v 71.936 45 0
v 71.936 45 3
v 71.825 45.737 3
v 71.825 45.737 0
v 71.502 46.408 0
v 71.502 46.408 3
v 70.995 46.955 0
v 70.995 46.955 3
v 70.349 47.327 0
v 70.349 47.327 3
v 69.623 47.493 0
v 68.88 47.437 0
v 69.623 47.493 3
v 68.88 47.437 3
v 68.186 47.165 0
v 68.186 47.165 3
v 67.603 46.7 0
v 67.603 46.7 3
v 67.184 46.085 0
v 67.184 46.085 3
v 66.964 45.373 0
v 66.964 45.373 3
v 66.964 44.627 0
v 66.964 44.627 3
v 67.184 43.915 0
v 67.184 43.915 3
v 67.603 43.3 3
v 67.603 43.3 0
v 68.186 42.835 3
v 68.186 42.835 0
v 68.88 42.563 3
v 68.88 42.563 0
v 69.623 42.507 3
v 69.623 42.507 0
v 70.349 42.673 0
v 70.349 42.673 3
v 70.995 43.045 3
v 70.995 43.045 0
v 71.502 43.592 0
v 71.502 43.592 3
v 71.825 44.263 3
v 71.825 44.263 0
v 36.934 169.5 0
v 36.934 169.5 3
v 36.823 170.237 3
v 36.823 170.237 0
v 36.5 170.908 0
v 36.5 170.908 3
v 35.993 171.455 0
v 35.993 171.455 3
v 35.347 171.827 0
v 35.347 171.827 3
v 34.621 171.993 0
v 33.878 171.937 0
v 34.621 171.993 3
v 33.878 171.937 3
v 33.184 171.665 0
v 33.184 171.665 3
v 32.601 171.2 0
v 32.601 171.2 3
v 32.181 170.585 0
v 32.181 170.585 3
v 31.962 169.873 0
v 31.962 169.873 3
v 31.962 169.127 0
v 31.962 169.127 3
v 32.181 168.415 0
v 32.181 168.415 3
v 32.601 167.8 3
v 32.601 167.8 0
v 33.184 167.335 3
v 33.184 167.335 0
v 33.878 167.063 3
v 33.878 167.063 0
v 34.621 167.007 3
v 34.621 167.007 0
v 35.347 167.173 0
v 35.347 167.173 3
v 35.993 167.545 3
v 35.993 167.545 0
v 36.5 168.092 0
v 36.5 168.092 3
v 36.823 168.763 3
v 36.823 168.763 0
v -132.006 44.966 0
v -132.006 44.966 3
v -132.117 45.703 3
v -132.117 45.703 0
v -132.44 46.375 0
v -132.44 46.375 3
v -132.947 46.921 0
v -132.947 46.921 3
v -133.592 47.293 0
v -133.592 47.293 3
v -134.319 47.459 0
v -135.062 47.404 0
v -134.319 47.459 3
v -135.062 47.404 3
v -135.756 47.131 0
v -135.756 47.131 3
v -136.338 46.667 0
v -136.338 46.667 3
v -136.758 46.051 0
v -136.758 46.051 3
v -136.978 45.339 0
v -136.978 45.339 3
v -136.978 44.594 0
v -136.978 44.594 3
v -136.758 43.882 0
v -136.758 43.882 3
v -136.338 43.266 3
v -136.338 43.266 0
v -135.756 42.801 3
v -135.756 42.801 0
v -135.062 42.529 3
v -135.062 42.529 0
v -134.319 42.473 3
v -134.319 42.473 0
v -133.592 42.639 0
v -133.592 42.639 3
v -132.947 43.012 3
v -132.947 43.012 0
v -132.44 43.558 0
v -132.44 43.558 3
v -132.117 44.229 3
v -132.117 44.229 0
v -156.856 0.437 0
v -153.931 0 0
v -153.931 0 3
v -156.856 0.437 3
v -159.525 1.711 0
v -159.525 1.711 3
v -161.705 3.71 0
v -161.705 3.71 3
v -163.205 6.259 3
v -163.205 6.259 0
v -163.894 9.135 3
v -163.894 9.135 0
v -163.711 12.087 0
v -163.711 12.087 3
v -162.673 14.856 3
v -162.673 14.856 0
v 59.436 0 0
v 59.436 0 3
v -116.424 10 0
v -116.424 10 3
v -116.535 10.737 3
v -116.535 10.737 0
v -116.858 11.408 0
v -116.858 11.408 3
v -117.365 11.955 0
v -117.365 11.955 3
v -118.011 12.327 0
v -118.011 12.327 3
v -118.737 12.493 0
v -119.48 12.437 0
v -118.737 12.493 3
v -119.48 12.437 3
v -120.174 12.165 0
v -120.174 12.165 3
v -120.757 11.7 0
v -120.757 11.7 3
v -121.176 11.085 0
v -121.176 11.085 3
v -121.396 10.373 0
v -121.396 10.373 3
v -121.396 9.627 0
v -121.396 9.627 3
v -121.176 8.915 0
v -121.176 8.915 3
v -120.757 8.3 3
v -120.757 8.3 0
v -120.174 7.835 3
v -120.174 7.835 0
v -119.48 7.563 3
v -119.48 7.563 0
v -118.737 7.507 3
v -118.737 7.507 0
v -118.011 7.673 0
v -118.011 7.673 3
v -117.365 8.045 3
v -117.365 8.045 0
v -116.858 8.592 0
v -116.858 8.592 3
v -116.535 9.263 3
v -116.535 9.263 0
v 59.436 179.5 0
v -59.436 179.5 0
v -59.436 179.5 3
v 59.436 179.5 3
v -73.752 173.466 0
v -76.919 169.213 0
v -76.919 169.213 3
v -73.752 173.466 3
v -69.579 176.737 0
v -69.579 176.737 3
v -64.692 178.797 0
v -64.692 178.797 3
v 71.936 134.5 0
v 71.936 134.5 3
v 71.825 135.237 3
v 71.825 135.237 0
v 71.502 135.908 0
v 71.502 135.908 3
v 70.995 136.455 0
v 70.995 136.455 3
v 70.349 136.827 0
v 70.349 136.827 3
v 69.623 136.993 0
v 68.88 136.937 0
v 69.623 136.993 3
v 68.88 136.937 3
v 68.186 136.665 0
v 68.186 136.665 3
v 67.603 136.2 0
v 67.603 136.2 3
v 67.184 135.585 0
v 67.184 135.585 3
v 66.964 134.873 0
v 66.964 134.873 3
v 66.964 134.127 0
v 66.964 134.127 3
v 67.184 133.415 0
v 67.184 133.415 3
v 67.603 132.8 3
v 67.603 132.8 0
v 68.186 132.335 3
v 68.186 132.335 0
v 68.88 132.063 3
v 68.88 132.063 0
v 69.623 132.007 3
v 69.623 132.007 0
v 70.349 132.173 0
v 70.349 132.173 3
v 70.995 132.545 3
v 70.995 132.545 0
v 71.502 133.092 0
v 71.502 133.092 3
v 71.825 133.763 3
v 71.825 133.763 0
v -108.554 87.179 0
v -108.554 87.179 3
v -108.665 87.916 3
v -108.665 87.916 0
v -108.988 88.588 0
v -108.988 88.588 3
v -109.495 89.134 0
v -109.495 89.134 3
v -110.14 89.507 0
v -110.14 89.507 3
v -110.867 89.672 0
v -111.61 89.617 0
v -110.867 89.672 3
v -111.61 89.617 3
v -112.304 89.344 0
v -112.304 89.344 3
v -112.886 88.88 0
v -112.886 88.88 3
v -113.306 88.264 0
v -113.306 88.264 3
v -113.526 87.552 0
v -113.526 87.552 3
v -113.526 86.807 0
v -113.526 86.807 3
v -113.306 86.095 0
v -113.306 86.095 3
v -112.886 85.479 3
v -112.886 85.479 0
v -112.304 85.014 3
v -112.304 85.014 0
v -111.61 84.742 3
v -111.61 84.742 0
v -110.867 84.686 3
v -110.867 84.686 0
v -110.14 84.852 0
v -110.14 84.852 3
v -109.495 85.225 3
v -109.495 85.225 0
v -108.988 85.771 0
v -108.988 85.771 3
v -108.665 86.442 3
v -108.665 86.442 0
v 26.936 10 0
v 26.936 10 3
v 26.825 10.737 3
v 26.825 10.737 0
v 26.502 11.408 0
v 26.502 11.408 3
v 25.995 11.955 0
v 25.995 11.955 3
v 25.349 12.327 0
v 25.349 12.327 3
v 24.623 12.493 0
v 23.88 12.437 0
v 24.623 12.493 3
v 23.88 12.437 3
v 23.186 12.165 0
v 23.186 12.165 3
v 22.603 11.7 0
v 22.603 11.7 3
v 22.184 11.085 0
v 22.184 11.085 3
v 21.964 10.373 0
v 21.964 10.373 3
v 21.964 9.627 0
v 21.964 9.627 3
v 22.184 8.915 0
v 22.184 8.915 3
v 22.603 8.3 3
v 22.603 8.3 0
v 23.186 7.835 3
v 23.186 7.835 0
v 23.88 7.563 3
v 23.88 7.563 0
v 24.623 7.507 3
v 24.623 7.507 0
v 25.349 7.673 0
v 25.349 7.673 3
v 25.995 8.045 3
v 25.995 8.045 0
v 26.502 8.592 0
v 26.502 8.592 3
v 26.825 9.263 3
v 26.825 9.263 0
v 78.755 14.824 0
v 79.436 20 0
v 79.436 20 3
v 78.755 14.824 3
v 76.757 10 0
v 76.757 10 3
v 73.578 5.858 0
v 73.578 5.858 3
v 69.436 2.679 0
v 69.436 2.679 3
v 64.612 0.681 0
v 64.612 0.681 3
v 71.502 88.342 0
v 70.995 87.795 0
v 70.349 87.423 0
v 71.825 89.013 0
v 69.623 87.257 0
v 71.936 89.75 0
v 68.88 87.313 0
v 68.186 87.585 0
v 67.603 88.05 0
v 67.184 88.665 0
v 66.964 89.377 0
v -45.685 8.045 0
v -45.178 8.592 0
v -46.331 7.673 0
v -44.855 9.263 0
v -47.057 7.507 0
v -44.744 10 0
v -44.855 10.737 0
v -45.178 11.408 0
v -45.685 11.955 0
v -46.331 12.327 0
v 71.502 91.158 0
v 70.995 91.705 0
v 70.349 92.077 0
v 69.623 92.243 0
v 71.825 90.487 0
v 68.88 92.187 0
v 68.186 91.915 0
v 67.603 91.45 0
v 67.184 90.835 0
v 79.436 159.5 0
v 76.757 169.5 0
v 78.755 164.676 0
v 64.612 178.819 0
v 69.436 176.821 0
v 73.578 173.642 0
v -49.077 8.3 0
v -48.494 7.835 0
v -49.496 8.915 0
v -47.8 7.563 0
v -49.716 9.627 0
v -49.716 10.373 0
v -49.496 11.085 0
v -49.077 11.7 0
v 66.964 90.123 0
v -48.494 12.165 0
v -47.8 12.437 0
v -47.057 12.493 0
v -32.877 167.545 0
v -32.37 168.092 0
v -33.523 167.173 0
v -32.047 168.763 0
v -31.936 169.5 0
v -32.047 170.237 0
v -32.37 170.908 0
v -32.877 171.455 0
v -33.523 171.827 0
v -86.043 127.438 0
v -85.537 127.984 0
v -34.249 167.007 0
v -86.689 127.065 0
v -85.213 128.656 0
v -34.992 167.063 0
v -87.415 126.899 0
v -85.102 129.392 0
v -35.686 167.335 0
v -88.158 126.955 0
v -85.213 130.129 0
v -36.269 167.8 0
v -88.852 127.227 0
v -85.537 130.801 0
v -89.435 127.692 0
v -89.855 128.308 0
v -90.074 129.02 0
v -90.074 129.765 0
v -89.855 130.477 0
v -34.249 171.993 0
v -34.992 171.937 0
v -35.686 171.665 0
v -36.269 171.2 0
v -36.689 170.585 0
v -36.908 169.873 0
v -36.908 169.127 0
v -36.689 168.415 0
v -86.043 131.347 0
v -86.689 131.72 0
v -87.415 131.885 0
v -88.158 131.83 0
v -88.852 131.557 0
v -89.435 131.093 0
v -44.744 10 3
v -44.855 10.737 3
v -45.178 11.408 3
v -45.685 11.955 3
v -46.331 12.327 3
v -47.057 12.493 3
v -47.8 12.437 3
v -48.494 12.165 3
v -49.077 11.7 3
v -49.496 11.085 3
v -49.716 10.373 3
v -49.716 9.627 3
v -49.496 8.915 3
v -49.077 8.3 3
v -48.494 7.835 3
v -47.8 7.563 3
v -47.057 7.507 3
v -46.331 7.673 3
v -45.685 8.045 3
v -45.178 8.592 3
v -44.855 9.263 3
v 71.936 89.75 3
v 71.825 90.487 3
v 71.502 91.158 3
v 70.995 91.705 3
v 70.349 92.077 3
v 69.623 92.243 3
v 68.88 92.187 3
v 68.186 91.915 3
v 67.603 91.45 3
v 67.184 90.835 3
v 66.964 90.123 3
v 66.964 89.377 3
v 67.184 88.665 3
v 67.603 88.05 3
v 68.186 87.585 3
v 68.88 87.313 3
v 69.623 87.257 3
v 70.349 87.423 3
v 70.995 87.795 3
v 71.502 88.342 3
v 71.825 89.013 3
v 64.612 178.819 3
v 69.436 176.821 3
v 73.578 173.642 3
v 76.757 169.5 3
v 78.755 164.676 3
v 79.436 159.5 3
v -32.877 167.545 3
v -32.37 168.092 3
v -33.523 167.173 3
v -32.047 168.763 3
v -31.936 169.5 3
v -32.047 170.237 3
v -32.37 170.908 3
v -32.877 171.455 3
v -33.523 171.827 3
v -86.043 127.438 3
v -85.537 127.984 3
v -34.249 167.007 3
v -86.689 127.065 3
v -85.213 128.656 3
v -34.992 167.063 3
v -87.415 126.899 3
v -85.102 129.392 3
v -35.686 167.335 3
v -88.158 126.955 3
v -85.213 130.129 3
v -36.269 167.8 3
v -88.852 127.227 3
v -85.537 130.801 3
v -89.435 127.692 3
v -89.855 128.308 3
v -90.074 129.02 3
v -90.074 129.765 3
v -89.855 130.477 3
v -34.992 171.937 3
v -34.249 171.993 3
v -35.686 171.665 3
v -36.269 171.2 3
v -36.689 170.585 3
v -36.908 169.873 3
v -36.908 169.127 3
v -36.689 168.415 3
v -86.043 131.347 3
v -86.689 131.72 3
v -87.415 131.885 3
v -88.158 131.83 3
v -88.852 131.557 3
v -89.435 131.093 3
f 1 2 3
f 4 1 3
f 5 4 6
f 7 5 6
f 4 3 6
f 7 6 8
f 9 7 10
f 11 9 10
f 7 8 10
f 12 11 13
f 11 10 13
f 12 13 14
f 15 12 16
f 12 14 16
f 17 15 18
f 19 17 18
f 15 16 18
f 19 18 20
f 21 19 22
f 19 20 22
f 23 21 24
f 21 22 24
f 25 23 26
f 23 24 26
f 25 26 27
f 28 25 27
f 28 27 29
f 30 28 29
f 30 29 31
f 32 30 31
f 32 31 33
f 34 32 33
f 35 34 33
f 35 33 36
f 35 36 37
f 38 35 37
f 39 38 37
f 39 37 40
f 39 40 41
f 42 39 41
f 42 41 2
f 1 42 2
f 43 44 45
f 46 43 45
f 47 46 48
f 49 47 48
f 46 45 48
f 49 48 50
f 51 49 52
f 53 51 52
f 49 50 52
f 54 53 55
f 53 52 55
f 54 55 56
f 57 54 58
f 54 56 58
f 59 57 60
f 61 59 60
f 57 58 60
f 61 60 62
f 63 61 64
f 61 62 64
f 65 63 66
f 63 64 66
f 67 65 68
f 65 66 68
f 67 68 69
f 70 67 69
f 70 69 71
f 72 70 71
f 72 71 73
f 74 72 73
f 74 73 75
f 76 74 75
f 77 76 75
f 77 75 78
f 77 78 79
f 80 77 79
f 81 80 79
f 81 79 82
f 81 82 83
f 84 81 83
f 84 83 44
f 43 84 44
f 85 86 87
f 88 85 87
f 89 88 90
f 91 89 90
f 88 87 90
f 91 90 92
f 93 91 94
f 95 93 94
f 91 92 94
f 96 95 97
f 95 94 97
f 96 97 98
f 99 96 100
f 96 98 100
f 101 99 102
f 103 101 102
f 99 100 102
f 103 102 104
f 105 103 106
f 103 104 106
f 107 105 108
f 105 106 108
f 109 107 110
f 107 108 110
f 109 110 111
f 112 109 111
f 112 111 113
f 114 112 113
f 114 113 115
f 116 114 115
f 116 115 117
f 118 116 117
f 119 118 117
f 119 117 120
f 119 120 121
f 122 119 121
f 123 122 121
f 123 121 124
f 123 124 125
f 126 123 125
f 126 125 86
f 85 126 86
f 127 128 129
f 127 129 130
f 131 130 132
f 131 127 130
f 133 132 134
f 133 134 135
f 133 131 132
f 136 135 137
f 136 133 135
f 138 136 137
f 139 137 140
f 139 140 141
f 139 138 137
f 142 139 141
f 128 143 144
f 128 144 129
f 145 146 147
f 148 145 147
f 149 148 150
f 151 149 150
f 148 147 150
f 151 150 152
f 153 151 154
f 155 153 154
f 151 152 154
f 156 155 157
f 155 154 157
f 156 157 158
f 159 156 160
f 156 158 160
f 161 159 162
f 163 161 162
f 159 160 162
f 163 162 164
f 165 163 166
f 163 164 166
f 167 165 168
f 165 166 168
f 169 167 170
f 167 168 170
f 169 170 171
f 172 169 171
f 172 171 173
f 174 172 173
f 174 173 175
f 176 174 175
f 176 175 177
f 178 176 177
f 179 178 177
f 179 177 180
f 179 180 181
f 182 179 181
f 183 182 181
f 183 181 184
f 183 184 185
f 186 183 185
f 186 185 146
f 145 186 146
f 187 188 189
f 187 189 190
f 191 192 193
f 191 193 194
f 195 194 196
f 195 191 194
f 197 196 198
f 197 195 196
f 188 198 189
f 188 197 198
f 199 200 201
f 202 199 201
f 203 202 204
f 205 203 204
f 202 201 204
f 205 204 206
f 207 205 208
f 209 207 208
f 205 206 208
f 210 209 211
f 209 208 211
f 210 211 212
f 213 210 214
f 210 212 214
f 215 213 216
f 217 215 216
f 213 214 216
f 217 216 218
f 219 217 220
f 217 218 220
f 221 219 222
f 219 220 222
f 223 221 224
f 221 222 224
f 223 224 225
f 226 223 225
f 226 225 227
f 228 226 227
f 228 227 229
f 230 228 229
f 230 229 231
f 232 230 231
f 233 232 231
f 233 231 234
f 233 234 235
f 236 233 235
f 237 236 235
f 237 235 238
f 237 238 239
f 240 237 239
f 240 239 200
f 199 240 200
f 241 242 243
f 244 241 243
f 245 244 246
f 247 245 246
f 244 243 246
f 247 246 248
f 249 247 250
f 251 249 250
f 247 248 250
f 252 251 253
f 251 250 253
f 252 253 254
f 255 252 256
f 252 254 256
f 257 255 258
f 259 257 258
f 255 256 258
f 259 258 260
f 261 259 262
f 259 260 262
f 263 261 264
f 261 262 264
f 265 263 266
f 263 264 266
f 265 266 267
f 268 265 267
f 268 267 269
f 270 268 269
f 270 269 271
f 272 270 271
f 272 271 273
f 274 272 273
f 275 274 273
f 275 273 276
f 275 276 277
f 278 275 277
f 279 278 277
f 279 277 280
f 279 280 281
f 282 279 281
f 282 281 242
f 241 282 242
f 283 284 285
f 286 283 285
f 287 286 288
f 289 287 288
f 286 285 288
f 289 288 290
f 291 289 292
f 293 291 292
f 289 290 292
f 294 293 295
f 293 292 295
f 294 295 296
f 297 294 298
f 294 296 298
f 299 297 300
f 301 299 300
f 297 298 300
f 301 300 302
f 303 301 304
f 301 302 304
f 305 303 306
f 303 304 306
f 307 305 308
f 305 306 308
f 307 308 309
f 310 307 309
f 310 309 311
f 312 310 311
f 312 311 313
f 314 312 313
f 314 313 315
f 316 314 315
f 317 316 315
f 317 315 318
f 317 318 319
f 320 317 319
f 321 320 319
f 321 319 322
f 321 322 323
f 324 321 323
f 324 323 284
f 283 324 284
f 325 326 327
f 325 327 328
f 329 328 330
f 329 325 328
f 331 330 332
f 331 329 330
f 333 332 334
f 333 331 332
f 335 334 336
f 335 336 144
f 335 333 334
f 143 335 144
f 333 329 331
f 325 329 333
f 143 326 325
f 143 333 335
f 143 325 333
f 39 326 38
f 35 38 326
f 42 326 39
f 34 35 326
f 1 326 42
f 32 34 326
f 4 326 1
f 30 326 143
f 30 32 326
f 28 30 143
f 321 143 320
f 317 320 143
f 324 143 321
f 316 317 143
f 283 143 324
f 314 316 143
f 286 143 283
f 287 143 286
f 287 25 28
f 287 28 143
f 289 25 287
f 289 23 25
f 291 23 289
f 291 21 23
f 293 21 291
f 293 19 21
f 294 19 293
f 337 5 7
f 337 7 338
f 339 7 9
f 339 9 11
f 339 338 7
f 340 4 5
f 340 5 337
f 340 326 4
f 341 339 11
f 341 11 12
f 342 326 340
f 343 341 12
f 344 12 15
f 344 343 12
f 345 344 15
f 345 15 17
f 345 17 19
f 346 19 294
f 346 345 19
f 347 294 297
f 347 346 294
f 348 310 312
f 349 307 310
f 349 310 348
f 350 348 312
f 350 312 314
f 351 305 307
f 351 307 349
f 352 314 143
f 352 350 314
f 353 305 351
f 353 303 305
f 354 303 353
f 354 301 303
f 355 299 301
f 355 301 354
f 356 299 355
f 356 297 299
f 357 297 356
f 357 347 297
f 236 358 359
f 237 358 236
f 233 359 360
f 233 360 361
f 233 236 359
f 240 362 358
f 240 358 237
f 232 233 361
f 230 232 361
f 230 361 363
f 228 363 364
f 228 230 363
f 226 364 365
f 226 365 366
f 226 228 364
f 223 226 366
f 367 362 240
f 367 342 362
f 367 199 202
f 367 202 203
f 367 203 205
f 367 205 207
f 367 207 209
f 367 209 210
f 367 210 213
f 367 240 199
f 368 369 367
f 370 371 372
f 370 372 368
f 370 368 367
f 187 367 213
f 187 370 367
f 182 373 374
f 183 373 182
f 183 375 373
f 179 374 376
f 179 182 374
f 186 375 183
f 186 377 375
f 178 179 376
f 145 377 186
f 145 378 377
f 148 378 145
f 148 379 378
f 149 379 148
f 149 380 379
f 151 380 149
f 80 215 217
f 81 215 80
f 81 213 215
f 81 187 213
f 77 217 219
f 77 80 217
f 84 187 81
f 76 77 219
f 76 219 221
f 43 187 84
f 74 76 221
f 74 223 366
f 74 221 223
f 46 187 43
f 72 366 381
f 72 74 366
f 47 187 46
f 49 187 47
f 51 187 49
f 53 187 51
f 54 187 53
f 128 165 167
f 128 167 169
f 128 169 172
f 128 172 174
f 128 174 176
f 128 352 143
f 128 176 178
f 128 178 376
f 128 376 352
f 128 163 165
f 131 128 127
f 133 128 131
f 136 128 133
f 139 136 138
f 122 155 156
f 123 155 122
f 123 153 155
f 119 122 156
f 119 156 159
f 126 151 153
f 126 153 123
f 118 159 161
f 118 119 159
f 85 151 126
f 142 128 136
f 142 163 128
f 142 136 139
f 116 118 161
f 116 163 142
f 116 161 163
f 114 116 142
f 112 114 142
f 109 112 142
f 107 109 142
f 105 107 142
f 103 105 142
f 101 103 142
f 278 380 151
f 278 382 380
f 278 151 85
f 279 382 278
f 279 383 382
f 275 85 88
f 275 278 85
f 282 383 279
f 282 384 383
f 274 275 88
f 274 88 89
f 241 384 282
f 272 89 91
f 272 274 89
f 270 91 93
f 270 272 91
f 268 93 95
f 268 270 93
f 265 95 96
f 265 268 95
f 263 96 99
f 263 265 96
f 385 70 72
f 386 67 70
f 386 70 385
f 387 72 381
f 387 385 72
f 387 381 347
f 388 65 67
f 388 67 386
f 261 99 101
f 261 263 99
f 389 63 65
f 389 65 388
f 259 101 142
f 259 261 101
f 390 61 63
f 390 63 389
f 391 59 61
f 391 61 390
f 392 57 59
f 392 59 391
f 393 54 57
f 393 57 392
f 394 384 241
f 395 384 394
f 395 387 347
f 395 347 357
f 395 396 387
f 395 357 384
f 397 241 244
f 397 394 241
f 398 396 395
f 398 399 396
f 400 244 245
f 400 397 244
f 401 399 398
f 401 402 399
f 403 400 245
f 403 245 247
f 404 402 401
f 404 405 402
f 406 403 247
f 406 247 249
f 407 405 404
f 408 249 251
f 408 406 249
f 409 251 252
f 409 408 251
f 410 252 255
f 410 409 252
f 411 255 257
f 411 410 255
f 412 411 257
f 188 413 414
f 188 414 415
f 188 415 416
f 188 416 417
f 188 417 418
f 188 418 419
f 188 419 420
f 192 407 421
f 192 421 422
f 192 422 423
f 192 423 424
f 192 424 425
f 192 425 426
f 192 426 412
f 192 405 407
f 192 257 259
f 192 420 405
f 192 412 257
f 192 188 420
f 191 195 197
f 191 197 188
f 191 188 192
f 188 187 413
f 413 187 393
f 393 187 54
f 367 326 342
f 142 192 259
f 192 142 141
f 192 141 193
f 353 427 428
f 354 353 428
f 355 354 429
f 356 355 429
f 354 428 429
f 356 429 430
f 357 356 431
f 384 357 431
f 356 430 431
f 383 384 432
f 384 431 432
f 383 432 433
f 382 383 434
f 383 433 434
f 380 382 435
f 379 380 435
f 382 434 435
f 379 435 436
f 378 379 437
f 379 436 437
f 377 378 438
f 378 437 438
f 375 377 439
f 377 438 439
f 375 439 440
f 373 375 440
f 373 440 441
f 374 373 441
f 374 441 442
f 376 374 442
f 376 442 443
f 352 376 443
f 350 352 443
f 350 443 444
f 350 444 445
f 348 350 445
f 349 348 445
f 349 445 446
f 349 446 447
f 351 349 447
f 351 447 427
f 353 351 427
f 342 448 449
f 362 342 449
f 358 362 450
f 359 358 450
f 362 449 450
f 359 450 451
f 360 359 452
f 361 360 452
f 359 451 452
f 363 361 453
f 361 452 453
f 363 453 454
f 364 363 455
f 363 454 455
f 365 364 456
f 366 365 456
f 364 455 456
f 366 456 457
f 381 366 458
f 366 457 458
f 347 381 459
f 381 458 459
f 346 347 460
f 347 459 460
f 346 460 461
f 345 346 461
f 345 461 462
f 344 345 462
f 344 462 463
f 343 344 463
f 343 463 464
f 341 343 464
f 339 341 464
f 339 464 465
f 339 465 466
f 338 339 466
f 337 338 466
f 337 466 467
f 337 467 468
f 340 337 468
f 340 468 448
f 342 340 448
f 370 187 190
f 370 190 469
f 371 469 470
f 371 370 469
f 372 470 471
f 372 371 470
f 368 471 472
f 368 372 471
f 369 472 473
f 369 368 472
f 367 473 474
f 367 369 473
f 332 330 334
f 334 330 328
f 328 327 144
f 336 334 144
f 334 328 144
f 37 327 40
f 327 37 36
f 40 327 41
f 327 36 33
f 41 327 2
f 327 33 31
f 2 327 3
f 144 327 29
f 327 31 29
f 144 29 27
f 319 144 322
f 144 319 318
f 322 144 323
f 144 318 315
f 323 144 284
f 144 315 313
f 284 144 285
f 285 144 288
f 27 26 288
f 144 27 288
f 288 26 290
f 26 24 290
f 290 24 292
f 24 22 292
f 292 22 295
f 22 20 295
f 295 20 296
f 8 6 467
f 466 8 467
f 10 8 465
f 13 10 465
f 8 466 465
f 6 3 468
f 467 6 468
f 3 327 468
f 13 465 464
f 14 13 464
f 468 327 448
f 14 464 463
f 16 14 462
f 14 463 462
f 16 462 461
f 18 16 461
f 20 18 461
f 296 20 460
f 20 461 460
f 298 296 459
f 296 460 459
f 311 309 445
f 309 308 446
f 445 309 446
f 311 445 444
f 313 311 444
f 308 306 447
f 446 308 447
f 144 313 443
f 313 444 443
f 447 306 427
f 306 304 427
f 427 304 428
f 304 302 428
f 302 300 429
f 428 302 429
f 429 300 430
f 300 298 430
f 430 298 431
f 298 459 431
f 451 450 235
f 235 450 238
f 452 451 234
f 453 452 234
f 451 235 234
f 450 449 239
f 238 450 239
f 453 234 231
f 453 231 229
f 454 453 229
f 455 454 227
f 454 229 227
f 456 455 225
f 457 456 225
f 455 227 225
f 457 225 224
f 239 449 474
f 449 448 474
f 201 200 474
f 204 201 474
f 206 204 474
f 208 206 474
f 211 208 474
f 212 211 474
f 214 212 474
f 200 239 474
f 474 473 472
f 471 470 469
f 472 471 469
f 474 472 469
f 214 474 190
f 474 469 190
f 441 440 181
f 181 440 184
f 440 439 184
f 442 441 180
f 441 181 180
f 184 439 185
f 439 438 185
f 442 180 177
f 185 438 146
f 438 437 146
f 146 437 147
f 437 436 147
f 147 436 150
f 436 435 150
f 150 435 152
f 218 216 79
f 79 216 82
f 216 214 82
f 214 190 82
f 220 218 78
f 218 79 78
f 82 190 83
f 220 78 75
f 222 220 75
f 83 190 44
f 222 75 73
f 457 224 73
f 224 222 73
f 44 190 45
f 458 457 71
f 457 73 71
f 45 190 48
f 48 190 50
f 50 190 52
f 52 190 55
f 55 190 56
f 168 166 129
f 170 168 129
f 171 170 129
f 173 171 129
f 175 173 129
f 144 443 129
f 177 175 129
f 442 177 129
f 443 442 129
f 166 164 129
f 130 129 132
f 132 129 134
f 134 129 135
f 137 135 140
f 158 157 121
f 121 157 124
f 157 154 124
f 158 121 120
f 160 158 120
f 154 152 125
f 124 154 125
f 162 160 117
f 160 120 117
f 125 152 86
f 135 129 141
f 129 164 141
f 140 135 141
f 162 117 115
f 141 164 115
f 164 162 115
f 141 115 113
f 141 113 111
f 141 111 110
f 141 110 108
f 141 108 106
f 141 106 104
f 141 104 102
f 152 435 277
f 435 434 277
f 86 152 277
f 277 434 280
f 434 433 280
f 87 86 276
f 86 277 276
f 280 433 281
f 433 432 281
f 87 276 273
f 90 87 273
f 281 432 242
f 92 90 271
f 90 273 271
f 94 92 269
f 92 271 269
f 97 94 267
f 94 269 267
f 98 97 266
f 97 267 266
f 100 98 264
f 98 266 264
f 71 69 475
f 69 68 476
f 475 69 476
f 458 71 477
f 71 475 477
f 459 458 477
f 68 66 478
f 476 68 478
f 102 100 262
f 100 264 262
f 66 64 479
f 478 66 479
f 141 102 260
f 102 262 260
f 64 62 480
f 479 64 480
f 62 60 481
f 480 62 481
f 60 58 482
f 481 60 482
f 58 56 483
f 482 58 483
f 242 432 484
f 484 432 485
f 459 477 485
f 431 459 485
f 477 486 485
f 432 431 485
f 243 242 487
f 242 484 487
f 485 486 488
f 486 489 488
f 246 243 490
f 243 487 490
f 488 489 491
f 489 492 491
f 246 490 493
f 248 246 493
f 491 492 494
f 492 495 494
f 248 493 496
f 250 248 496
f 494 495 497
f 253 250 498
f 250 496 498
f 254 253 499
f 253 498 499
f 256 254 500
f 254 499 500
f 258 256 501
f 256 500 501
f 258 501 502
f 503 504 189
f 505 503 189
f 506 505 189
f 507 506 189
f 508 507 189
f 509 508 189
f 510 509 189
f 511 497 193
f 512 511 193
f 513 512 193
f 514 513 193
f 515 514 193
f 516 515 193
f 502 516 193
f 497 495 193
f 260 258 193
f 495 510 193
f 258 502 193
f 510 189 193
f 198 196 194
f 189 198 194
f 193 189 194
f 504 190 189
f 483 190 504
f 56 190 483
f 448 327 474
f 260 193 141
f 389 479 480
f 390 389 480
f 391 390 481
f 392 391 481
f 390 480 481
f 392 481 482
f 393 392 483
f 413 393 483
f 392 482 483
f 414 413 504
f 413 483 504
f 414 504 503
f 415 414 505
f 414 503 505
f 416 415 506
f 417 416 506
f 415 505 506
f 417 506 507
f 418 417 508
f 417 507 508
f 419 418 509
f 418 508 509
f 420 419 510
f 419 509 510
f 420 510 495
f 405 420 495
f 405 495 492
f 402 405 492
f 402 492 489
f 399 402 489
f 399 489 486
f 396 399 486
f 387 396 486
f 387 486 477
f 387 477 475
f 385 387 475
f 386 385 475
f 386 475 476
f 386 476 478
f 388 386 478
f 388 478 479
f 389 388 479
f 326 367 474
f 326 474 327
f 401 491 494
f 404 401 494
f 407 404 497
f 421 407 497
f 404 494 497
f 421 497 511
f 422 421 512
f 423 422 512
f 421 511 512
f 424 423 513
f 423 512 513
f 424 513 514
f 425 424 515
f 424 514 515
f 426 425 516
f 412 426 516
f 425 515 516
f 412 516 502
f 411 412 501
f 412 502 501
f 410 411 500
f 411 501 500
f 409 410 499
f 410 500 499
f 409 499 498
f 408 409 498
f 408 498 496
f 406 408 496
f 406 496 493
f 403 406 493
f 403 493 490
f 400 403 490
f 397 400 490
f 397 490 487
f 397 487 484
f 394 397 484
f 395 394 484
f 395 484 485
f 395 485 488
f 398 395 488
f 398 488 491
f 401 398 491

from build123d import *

# Parameters (mm, degrees)
BOSS_EXTRUDE1_DEPTH = 3
CUT_EXTRUDE1_REACH  = 245.11
SKETCH2_R           = 2.5


with BuildPart() as part:
    # Sketch1 → Boss-Extrude1 (new body)
    with BuildSketch(Plane.XY):
        with BuildLine():
            Line((-59.436088262, 179.5), (59.436088262, 179.5))
            ThreePointArc((59.436088262, 179.5), (73.578223886, 173.642135624), (79.436088262, 159.5))
            Line((79.436088262, 159.5), (79.436088262, 20))
            ThreePointArc((79.436088262, 20), (73.578223886, 5.857864376), (59.436088262, 0))
            Line((59.436088262, 0), (-153.931232863, 0))
            ThreePointArc((-153.931232863, 0), (-162.549941964, 4.928722701), (-162.672805625, 14.856429312))
            Line((-162.672805625, 14.856429312), (-76.919233785, 169.212858624))
            ThreePointArc((-76.919233785, 169.212858624), (-69.57864286, 176.737418201), (-59.436088262, 179.5))
        make_face()
    extrude(amount=BOSS_EXTRUDE1_DEPTH)

    # Sketch2 → Cut-Extrude1 (cut, up to next)
    with BuildSketch(Plane.XY.offset(3), mode=Mode.PRIVATE) as cut_extrude1_sk1:
        with Locations((-34.436088262, 169.5)):
            Circle(SKETCH2_R)
    cut_extrude1_tool1 = extrude(cut_extrude1_sk1.sketch, amount=-CUT_EXTRUDE1_REACH, mode=Mode.PRIVATE) & part.part
    # Sketch2 → Cut-Extrude1 (cut, up to next)
    with BuildSketch(Plane.XY.offset(3), mode=Mode.PRIVATE) as cut_extrude1_sk2:
        with Locations((34.433911738, 169.5)):
            Circle(SKETCH2_R)
    cut_extrude1_tool2 = extrude(cut_extrude1_sk2.sketch, amount=-CUT_EXTRUDE1_REACH, mode=Mode.PRIVATE) & part.part
    # Sketch2 → Cut-Extrude1 (cut, up to next)
    with BuildSketch(Plane.XY.offset(3), mode=Mode.PRIVATE) as cut_extrude1_sk3:
        with Locations((69.436088262, 134.5)):
            Circle(SKETCH2_R)
    cut_extrude1_tool3 = extrude(cut_extrude1_sk3.sketch, amount=-CUT_EXTRUDE1_REACH, mode=Mode.PRIVATE) & part.part
    # Sketch2 → Cut-Extrude1 (cut, up to next)
    with BuildSketch(Plane.XY.offset(3), mode=Mode.PRIVATE) as cut_extrude1_sk4:
        with Locations((69.436088262, 89.75)):
            Circle(SKETCH2_R)
    cut_extrude1_tool4 = extrude(cut_extrude1_sk4.sketch, amount=-CUT_EXTRUDE1_REACH, mode=Mode.PRIVATE) & part.part
    # Sketch2 → Cut-Extrude1 (cut, up to next)
    with BuildSketch(Plane.XY.offset(3), mode=Mode.PRIVATE) as cut_extrude1_sk5:
        with Locations((69.436088262, 45)):
            Circle(SKETCH2_R)
    cut_extrude1_tool5 = extrude(cut_extrude1_sk5.sketch, amount=-CUT_EXTRUDE1_REACH, mode=Mode.PRIVATE) & part.part
    # Sketch2 → Cut-Extrude1 (cut, up to next)
    with BuildSketch(Plane.XY.offset(3), mode=Mode.PRIVATE) as cut_extrude1_sk6:
        with Locations((24.436088262, 10)):
            Circle(SKETCH2_R)
    cut_extrude1_tool6 = extrude(cut_extrude1_sk6.sketch, amount=-CUT_EXTRUDE1_REACH, mode=Mode.PRIVATE) & part.part
    # Sketch2 → Cut-Extrude1 (cut, up to next)
    with BuildSketch(Plane.XY.offset(3), mode=Mode.PRIVATE) as cut_extrude1_sk7:
        with Locations((-47.243911738, 10)):
            Circle(SKETCH2_R)
    cut_extrude1_tool7 = extrude(cut_extrude1_sk7.sketch, amount=-CUT_EXTRUDE1_REACH, mode=Mode.PRIVATE) & part.part
    # Sketch2 → Cut-Extrude1 (cut, up to next)
    with BuildSketch(Plane.XY.offset(3), mode=Mode.PRIVATE) as cut_extrude1_sk8:
        with Locations((-118.923911738, 10)):
            Circle(SKETCH2_R)
    cut_extrude1_tool8 = extrude(cut_extrude1_sk8.sketch, amount=-CUT_EXTRUDE1_REACH, mode=Mode.PRIVATE) & part.part
    # Sketch2 → Cut-Extrude1 (cut, up to next)
    with BuildSketch(Plane.XY.offset(3), mode=Mode.PRIVATE) as cut_extrude1_sk9:
        with Locations((-134.505515616, 44.966291045)):
            Circle(SKETCH2_R)
    cut_extrude1_tool9 = extrude(cut_extrude1_sk9.sketch, amount=-CUT_EXTRUDE1_REACH, mode=Mode.PRIVATE) & part.part
    # Sketch2 → Cut-Extrude1 (cut, up to next)
    with BuildSketch(Plane.XY.offset(3), mode=Mode.PRIVATE) as cut_extrude1_sk10:
        with Locations((-87.602121323, 129.392400773)):
            Circle(SKETCH2_R)
    cut_extrude1_tool10 = extrude(cut_extrude1_sk10.sketch, amount=-CUT_EXTRUDE1_REACH, mode=Mode.PRIVATE) & part.part
    # Sketch2 → Cut-Extrude1 (cut, up to next)
    with BuildSketch(Plane.XY.offset(3), mode=Mode.PRIVATE) as cut_extrude1_sk11:
        with Locations((-111.05381847, 87.179345909)):
            Circle(SKETCH2_R)
    cut_extrude1_tool11 = extrude(cut_extrude1_sk11.sketch, amount=-CUT_EXTRUDE1_REACH, mode=Mode.PRIVATE) & part.part
    add(cut_extrude1_tool1.solids().sort_by_distance((-34.436088, 169.5, 3))[0], mode=Mode.SUBTRACT)
    add(cut_extrude1_tool2.solids().sort_by_distance((34.433912, 169.5, 3))[0], mode=Mode.SUBTRACT)
    add(cut_extrude1_tool3.solids().sort_by_distance((69.436088, 134.5, 3))[0], mode=Mode.SUBTRACT)
    add(cut_extrude1_tool4.solids().sort_by_distance((69.436088, 89.75, 3))[0], mode=Mode.SUBTRACT)
    add(cut_extrude1_tool5.solids().sort_by_distance((69.436088, 45, 3))[0], mode=Mode.SUBTRACT)
    add(cut_extrude1_tool6.solids().sort_by_distance((24.436088, 10, 3))[0], mode=Mode.SUBTRACT)
    add(cut_extrude1_tool7.solids().sort_by_distance((-47.243912, 10, 3))[0], mode=Mode.SUBTRACT)
    add(cut_extrude1_tool8.solids().sort_by_distance((-118.923912, 10, 3))[0], mode=Mode.SUBTRACT)
    add(cut_extrude1_tool9.solids().sort_by_distance((-134.505516, 44.966291, 3))[0], mode=Mode.SUBTRACT)
    add(cut_extrude1_tool10.solids().sort_by_distance((-87.602121, 129.392401, 3))[0], mode=Mode.SUBTRACT)
    add(cut_extrude1_tool11.solids().sort_by_distance((-111.053818, 87.179346, 3))[0], mode=Mode.SUBTRACT)


solid = part.part
